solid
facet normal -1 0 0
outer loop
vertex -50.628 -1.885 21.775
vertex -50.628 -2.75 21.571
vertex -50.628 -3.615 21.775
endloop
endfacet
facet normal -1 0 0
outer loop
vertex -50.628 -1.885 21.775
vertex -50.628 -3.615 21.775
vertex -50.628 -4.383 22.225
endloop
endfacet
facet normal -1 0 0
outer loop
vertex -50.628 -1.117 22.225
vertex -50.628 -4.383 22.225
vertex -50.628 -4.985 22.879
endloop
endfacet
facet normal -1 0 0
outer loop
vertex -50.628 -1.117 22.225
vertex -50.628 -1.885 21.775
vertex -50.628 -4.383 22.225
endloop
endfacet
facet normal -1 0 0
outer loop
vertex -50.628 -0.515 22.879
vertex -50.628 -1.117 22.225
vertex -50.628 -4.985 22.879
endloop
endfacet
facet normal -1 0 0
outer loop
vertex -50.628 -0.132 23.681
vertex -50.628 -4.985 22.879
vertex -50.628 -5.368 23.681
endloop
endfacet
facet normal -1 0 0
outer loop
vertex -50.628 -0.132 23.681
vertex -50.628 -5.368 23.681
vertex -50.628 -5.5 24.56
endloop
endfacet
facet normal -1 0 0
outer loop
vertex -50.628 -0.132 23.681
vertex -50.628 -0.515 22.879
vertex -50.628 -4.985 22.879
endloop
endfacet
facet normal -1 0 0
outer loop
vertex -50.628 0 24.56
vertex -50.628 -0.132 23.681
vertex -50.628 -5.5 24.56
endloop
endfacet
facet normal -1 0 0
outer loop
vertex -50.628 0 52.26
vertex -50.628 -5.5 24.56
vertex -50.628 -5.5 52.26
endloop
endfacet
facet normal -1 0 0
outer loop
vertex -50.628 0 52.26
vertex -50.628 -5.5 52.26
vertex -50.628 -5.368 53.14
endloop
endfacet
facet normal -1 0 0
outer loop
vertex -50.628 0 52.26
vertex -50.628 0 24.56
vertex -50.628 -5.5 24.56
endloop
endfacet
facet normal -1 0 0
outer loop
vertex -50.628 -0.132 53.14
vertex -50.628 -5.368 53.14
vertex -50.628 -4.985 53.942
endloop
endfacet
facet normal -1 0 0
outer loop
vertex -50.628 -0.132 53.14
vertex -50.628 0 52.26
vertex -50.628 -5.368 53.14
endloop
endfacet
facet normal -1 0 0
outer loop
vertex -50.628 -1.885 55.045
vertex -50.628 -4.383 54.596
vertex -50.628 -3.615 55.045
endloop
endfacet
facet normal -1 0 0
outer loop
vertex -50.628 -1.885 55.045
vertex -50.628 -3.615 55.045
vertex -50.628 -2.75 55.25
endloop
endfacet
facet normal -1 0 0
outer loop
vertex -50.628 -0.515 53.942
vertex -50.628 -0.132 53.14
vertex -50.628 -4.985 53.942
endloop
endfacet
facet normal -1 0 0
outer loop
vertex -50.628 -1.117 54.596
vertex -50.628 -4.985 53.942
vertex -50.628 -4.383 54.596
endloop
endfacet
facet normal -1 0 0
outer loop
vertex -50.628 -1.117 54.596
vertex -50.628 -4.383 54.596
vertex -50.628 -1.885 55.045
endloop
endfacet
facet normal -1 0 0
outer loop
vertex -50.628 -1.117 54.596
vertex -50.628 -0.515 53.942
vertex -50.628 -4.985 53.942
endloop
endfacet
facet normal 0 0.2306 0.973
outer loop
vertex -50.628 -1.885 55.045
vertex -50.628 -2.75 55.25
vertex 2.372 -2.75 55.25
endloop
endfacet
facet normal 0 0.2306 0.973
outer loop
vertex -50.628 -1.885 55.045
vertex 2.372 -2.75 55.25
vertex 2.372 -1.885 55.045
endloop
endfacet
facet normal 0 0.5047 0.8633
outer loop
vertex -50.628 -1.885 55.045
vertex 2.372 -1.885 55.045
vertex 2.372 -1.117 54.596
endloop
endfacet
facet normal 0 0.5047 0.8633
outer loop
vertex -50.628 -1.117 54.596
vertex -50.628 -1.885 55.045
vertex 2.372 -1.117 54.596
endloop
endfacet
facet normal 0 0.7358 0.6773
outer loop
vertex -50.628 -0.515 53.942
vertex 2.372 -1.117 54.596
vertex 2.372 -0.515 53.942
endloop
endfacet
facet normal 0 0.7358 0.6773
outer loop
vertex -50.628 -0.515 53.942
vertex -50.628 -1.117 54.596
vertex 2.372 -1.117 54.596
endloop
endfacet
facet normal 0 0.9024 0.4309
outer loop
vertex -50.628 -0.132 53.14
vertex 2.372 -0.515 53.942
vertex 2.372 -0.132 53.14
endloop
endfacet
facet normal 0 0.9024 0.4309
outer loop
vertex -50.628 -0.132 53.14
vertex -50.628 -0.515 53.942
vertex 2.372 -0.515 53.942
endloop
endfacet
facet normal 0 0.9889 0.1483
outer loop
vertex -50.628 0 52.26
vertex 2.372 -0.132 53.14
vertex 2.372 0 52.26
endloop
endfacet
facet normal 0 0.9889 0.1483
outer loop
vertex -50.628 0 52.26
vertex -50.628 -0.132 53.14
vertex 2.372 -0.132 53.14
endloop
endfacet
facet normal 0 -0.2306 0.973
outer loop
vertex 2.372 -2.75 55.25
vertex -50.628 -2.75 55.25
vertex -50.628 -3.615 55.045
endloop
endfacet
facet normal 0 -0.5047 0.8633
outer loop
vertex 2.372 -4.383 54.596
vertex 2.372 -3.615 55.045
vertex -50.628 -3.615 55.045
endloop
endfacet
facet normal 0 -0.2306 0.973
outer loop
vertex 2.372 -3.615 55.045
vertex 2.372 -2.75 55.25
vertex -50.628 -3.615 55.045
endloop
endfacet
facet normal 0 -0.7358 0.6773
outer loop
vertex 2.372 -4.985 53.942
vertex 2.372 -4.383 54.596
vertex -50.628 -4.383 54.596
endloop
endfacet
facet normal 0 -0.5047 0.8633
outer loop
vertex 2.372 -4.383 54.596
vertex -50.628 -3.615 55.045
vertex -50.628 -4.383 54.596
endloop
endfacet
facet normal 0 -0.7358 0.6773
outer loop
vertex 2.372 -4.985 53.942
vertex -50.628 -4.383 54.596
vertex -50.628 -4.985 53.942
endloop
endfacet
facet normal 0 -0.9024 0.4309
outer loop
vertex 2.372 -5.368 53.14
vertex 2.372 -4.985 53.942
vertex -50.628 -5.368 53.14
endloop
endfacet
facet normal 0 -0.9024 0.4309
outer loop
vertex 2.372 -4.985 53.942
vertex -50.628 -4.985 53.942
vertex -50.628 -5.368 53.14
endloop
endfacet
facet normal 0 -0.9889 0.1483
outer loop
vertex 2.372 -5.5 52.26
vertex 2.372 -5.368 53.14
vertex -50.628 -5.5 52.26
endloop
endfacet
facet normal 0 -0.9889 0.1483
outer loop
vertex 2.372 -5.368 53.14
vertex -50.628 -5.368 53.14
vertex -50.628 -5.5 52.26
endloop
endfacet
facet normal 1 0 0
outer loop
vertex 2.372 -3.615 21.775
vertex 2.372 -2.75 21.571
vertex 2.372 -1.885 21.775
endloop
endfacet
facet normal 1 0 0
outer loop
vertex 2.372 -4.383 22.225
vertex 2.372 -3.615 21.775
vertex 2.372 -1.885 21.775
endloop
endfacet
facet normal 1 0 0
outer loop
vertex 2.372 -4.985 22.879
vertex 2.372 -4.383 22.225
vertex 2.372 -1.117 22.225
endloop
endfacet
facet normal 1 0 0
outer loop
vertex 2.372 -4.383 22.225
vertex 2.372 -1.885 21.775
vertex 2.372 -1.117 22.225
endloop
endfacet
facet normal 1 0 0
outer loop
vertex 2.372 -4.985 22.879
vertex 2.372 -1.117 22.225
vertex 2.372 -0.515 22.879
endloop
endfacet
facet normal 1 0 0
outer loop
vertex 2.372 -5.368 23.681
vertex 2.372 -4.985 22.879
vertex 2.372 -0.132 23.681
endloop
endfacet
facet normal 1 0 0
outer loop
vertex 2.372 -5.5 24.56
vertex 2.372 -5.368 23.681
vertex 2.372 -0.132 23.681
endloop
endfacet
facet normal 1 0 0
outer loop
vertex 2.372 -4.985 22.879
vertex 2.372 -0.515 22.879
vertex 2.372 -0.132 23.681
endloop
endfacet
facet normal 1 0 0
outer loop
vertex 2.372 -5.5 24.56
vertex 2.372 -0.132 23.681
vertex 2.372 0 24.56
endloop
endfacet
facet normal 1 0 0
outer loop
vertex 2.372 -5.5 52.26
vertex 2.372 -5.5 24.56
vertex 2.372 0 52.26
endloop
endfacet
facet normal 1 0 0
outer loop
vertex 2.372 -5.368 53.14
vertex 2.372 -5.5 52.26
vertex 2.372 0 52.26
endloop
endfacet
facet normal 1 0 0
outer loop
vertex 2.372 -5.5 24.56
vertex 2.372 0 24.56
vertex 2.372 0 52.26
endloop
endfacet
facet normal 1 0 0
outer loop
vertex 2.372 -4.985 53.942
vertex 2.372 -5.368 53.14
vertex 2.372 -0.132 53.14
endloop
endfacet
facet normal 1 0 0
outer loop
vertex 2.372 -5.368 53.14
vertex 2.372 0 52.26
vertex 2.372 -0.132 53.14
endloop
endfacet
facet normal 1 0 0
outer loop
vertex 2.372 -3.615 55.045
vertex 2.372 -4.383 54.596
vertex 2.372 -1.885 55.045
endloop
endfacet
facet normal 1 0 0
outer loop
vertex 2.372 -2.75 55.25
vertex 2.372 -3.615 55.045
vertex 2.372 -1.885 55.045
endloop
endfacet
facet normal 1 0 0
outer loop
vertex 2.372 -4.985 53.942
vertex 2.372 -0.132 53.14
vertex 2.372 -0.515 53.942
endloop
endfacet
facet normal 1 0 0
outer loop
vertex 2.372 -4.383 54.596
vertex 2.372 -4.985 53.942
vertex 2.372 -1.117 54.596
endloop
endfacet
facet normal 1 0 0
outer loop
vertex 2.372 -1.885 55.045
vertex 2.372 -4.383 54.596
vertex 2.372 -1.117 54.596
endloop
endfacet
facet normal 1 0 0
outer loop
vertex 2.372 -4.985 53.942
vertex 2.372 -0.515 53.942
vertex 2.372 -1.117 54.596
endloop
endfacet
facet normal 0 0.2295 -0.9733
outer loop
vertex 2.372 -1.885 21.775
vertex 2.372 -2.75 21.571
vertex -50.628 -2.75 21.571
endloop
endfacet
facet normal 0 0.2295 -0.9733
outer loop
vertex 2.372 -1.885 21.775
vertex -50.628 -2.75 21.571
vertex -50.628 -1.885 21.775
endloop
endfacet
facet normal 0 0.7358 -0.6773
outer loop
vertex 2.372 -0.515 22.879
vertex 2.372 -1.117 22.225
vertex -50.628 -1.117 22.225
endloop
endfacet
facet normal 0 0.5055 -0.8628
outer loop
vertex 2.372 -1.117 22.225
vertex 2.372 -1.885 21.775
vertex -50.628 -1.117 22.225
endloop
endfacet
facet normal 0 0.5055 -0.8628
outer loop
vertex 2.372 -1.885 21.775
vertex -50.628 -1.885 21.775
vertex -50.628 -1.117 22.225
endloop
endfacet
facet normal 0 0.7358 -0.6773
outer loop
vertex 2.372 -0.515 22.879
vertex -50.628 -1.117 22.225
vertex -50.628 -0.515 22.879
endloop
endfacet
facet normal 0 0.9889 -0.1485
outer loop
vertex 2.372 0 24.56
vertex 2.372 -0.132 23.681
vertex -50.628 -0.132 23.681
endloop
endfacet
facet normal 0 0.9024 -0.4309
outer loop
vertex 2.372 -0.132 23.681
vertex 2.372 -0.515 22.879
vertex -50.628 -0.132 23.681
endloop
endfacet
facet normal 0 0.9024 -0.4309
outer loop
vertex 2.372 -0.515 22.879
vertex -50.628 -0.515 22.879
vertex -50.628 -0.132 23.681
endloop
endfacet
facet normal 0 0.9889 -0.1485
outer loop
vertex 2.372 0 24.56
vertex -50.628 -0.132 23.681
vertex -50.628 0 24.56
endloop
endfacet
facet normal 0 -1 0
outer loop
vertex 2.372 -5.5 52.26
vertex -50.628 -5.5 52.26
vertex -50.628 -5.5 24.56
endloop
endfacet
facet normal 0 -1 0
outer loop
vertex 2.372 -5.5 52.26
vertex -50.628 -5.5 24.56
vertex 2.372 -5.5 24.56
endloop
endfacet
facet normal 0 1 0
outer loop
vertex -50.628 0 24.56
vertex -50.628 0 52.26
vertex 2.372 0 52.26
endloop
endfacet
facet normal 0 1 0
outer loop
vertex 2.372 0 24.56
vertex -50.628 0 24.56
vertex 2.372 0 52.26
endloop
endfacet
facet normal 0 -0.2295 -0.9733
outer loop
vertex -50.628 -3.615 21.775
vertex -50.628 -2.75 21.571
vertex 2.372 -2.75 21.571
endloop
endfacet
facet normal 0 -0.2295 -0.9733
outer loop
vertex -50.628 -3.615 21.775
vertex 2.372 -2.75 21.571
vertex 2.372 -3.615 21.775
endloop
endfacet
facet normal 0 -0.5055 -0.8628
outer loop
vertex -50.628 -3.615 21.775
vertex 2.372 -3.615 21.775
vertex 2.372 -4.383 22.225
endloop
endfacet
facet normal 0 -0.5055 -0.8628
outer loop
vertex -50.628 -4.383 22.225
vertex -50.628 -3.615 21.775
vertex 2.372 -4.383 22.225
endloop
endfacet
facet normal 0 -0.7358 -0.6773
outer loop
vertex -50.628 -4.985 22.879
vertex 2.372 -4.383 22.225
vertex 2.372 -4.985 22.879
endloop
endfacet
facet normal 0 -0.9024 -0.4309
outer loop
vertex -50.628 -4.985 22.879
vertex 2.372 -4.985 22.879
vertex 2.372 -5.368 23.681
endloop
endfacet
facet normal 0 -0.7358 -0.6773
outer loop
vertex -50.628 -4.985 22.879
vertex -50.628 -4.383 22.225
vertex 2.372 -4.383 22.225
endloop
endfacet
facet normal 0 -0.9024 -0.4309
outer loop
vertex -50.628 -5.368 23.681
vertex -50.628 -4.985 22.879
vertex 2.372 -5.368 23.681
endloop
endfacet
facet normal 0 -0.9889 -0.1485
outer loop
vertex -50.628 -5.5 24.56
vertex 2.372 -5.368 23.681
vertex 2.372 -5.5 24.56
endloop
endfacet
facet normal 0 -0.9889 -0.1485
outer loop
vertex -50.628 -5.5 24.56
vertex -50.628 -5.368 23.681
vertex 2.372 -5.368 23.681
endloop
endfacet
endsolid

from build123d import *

# Parameters (mm, degrees)
F0_W        = 53
F0_H        = 33.7
F1_DEPTH    = 5.5
F2_T1_DEPTH = 68


# Not quite as in the source:
# - a fillet or chamfer that OpenCascade refuses, or shapes differently, is made with other operations: its cross-section is extruded or revolved along the edge and cut away or added


with BuildPart() as f1:
    # F0 (on Front) → F1 (new body)
    with BuildSketch(Plane.XZ):
        with Locations((-24.1282908246, 38.41047619)):
            Rectangle(F0_W, F0_H)
    extrude(amount=F1_DEPTH)

    # F2: fillet of radius 3 on 4 edges, made by hand

    # F2_s2 → F2_t1 (cut)
    with BuildSketch(Plane.YZ.offset(-58.1282908246)):
        with BuildLine():
            ThreePointArc((-2.5, 55.26047619), (-4.6213203436, 54.3817965336), (-5.5, 52.26047619))
            Line((-5.5, 52.26047619), (-5.5, 55.26047619))
            Line((-5.5, 55.26047619), (-2.5, 55.26047619))
        make_face()
        with BuildLine():
            ThreePointArc((-3, 55.26047619), (-0.8786796564, 54.3817965336), (0, 52.26047619))
            Line((0, 52.26047619), (0, 55.26047619))
            Line((0, 55.26047619), (-3, 55.26047619))
        make_face()
        with BuildLine():
            ThreePointArc((-3, 21.56047619), (-0.8786796564, 22.4391558465), (0, 24.56047619))
            Line((0, 24.56047619), (0, 21.56047619))
            Line((0, 21.56047619), (-3, 21.56047619))
        make_face()
        with BuildLine():
            ThreePointArc((-2.5, 21.56047619), (-4.6213203436, 22.4391558465), (-5.5, 24.56047619))
            Line((-5.5, 24.56047619), (-5.5, 21.56047619))
            Line((-5.5, 21.56047619), (-2.5, 21.56047619))
        make_face()
    extrude(amount=F2_T1_DEPTH, mode=Mode.SUBTRACT)


solid = f1.part
